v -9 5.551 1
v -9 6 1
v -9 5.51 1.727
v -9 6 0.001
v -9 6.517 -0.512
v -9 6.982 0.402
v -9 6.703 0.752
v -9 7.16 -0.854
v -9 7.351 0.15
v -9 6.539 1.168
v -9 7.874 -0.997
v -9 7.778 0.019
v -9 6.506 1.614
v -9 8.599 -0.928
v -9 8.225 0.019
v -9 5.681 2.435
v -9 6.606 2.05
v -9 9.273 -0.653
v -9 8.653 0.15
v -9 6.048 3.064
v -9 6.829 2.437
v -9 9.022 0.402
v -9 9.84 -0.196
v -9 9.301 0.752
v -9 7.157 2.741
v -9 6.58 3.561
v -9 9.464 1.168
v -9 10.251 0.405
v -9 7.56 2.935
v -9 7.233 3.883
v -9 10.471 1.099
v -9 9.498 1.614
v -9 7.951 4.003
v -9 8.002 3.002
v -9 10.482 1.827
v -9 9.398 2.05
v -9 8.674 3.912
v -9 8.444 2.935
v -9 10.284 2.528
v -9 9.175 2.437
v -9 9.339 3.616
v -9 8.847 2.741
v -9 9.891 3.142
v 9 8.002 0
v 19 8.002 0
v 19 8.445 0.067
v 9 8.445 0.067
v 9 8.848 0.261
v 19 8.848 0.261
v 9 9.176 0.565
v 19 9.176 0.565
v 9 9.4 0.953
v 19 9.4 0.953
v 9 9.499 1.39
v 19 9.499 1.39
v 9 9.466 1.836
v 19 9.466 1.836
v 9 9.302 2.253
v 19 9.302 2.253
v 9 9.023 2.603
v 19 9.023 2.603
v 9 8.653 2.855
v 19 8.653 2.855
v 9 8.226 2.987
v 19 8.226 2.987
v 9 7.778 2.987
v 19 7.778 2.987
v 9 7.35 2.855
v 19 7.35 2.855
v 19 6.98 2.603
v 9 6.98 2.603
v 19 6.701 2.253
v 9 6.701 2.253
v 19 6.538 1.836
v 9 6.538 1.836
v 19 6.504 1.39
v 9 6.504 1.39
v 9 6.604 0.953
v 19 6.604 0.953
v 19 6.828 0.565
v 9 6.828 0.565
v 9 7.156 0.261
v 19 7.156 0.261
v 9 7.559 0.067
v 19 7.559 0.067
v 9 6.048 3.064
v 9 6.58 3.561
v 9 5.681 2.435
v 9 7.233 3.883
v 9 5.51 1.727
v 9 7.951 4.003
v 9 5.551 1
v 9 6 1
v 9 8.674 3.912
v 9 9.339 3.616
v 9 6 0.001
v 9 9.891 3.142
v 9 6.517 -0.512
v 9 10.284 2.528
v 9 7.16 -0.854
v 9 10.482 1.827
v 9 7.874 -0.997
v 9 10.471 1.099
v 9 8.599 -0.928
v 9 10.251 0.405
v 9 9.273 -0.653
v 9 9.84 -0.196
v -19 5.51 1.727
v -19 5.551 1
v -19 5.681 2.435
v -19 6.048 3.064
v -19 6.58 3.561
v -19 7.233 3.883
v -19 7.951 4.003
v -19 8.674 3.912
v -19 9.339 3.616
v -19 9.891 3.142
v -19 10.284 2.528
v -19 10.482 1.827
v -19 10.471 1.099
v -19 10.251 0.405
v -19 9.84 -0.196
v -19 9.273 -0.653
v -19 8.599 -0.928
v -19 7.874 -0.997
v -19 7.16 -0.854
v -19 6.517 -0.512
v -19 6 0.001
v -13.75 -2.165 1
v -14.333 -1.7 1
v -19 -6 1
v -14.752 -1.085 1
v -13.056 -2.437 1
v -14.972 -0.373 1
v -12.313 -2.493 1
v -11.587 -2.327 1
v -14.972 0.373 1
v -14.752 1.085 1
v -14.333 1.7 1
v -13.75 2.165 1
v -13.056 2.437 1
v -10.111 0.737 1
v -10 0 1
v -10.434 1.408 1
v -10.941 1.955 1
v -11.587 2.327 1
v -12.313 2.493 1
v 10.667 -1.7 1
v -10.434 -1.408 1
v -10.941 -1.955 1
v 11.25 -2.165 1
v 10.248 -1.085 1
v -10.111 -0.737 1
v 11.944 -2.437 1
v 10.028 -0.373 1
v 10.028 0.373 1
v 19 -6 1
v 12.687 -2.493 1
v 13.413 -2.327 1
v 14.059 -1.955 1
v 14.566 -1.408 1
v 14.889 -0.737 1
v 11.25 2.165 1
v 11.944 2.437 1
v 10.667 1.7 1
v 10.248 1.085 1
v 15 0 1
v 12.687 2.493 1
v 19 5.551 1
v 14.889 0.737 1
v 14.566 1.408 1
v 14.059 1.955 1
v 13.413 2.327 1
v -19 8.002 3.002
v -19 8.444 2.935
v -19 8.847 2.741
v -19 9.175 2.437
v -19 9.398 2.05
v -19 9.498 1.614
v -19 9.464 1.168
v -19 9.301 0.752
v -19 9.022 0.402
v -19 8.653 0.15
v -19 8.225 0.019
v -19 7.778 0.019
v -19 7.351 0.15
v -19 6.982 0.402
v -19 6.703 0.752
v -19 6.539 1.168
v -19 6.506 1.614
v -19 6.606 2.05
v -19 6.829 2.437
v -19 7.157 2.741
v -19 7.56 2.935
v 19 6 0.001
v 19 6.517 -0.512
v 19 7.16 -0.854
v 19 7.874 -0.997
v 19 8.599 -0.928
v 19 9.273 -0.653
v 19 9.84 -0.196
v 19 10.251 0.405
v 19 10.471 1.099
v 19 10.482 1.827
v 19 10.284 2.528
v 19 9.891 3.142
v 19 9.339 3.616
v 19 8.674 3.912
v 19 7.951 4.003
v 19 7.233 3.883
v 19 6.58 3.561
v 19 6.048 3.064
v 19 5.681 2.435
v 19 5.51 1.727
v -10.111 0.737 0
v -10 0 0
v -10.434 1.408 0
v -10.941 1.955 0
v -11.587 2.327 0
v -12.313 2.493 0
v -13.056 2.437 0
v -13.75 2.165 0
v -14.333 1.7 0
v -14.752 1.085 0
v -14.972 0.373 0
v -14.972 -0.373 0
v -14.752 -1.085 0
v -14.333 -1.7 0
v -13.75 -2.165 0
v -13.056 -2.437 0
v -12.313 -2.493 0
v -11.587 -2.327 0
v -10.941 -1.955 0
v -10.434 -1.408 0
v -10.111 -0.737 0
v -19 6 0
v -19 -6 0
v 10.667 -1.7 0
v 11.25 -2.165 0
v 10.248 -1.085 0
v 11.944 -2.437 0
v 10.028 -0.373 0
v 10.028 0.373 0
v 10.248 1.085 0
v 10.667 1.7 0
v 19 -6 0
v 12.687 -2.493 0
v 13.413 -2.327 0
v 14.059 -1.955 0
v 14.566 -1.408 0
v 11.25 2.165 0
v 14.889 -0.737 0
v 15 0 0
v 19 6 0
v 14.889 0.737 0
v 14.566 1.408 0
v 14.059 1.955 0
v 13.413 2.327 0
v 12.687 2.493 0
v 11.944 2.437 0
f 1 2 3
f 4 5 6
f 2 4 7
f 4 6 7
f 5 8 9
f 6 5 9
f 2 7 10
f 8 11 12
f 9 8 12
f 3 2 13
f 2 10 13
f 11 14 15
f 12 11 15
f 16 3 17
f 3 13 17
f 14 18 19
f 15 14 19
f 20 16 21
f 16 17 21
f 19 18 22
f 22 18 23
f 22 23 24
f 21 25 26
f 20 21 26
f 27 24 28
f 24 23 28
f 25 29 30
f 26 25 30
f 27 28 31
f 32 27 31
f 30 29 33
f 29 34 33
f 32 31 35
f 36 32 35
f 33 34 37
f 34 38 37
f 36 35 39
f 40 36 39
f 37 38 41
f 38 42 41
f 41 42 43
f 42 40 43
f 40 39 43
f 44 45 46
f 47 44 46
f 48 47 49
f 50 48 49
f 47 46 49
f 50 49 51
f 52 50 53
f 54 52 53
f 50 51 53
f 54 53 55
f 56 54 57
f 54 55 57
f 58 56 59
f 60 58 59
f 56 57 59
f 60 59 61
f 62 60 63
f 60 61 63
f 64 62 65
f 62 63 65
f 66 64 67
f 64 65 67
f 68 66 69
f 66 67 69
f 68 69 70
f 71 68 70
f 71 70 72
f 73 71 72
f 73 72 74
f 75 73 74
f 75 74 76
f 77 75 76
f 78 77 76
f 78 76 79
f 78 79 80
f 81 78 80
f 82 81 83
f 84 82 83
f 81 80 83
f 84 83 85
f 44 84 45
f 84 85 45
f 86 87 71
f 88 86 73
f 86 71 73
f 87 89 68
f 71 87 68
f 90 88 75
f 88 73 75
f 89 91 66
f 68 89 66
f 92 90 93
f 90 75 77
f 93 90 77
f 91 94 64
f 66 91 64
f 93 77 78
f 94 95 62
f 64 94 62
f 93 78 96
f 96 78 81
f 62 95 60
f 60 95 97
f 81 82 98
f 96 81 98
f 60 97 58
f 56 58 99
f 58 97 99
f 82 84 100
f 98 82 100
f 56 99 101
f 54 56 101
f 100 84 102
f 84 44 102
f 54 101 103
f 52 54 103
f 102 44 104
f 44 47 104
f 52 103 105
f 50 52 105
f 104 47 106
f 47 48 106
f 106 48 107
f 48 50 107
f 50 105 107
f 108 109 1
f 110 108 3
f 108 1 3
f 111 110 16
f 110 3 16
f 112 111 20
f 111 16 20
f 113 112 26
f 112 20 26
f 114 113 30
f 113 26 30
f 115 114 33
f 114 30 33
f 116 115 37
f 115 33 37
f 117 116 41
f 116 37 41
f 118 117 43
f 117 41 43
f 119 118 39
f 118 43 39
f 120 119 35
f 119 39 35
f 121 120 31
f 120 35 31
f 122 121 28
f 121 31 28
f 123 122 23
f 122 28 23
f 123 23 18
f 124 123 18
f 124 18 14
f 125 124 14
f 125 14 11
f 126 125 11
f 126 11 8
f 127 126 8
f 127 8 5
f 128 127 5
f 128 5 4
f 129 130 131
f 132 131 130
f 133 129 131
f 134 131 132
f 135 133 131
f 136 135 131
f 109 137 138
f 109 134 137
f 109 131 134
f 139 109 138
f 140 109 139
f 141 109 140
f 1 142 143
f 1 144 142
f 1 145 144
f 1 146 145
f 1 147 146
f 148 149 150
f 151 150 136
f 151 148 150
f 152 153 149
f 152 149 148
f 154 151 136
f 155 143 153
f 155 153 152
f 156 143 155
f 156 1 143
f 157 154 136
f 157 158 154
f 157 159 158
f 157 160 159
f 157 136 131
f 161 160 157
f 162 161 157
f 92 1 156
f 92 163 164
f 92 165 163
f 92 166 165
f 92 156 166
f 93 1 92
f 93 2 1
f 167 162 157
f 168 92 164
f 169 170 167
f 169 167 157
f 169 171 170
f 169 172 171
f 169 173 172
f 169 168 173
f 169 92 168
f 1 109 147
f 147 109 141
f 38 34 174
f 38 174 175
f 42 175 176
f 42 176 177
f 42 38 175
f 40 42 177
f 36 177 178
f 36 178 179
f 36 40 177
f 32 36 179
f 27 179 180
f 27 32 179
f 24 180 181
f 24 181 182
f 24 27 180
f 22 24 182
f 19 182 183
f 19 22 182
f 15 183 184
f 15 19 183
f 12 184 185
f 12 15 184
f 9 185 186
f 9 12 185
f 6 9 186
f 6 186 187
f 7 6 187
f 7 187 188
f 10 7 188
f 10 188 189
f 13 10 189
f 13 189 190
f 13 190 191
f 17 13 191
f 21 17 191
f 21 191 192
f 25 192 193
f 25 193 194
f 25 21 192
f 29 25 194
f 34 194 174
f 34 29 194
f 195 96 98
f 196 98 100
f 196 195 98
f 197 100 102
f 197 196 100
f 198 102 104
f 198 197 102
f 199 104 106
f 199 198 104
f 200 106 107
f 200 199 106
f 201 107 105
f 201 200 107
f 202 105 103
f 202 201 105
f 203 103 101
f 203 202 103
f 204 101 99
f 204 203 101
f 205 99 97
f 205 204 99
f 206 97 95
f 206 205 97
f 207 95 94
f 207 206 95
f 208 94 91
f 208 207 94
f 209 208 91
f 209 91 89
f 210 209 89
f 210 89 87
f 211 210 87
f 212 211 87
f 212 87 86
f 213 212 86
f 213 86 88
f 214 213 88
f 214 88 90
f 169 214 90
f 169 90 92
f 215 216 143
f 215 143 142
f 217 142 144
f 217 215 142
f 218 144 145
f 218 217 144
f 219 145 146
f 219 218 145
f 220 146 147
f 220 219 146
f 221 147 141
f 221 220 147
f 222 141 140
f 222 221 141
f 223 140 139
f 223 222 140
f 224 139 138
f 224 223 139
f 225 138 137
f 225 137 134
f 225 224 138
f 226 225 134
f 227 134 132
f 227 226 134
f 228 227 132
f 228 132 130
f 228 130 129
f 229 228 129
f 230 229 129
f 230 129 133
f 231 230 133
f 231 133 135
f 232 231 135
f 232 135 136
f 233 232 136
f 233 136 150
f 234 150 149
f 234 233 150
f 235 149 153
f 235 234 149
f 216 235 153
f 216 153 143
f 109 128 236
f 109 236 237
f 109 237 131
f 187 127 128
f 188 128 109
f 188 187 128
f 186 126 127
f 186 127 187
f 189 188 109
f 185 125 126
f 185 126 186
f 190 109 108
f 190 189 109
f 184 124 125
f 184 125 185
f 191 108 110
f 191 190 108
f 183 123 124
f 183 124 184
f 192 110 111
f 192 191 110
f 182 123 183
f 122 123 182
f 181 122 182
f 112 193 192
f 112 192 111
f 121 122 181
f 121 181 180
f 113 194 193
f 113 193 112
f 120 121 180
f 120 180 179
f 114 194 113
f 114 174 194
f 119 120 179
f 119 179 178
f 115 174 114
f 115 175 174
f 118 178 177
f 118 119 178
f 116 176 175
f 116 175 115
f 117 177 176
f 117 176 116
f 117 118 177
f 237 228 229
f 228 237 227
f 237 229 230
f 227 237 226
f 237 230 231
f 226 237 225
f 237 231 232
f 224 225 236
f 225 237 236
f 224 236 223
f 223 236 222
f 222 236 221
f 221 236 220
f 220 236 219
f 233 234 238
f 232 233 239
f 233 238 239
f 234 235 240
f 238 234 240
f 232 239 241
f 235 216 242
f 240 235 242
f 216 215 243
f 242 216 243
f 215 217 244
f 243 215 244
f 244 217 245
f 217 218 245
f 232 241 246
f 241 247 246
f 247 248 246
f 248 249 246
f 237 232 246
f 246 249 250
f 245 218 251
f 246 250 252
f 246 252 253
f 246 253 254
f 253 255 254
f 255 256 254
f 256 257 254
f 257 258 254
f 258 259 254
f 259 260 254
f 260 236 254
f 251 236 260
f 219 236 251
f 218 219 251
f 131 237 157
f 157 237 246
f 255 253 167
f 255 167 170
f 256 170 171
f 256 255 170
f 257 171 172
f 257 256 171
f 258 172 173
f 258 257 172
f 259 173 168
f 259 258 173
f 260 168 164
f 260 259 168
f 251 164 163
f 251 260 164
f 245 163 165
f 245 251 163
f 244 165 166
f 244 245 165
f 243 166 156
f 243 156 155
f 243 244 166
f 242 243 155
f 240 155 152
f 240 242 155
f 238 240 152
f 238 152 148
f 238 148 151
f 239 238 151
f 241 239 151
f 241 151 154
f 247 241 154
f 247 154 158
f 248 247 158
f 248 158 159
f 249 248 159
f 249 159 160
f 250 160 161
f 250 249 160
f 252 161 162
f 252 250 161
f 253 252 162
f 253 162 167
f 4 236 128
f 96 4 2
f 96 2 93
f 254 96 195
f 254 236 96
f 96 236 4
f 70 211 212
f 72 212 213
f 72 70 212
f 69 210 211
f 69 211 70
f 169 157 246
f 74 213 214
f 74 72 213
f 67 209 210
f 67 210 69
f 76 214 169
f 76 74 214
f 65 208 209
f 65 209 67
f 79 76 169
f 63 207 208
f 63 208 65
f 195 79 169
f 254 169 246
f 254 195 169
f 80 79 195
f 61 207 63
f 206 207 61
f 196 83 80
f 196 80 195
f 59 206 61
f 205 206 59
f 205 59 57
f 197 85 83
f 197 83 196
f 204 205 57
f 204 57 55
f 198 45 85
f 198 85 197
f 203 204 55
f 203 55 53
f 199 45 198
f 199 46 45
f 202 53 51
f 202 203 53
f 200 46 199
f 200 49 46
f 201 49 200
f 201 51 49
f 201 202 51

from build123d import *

# Parameters (mm, degrees)
SKETCH_1_W      = 38
SKETCH_1_H      = 12
SKETCH_1_R      = 2.5
EXTRUDE_1_DEPTH = 1
SKETCH_3_R      = 2.50184692
SKETCH_3_R_2    = 1.5
EXTRUDE_4_DEPTH = 10
EXTRUDE_START   = 10
SKETCH_4_R      = 2.50184692
SKETCH_4_R_2    = 1.50184692
EXTRUDE_5_DEPTH = 10


with BuildPart() as part:
    # 草图1 → 凸台-拉伸1 (new body)
    with BuildSketch(Plane.XY):
        Rectangle(SKETCH_1_W, SKETCH_1_H)
        with Locations((12.5, 0)):
            Circle(SKETCH_1_R, mode=Mode.SUBTRACT)
        with Locations((-12.5, 0)):
            Circle(SKETCH_1_R, mode=Mode.SUBTRACT)
    extrude(amount=EXTRUDE_1_DEPTH)

    # 草图3 → 凸台-拉伸4 (add)
    with BuildSketch(Plane.ZY.offset(9)):
        with Locations((1.50184692, 8.00184692)):
            Circle(SKETCH_3_R)
        with Locations((1.50184692, 8.00184692)):
            Circle(SKETCH_3_R_2, mode=Mode.SUBTRACT)
    extrude(amount=EXTRUDE_4_DEPTH)

    # 草图4 → 凸台-拉伸5 (add)
    with BuildSketch(Plane(origin=(9, 0, 0), x_dir=(0, 0, -1), z_dir=(1, 0, 0)).offset(EXTRUDE_START)):
        with Locations((-1.50184692, 8.00184692)):
            Circle(SKETCH_4_R)
        with Locations((-1.50184692, 8.00184692)):
            Circle(SKETCH_4_R_2, mode=Mode.SUBTRACT)
    extrude(amount=-EXTRUDE_5_DEPTH)


solid = part.part
